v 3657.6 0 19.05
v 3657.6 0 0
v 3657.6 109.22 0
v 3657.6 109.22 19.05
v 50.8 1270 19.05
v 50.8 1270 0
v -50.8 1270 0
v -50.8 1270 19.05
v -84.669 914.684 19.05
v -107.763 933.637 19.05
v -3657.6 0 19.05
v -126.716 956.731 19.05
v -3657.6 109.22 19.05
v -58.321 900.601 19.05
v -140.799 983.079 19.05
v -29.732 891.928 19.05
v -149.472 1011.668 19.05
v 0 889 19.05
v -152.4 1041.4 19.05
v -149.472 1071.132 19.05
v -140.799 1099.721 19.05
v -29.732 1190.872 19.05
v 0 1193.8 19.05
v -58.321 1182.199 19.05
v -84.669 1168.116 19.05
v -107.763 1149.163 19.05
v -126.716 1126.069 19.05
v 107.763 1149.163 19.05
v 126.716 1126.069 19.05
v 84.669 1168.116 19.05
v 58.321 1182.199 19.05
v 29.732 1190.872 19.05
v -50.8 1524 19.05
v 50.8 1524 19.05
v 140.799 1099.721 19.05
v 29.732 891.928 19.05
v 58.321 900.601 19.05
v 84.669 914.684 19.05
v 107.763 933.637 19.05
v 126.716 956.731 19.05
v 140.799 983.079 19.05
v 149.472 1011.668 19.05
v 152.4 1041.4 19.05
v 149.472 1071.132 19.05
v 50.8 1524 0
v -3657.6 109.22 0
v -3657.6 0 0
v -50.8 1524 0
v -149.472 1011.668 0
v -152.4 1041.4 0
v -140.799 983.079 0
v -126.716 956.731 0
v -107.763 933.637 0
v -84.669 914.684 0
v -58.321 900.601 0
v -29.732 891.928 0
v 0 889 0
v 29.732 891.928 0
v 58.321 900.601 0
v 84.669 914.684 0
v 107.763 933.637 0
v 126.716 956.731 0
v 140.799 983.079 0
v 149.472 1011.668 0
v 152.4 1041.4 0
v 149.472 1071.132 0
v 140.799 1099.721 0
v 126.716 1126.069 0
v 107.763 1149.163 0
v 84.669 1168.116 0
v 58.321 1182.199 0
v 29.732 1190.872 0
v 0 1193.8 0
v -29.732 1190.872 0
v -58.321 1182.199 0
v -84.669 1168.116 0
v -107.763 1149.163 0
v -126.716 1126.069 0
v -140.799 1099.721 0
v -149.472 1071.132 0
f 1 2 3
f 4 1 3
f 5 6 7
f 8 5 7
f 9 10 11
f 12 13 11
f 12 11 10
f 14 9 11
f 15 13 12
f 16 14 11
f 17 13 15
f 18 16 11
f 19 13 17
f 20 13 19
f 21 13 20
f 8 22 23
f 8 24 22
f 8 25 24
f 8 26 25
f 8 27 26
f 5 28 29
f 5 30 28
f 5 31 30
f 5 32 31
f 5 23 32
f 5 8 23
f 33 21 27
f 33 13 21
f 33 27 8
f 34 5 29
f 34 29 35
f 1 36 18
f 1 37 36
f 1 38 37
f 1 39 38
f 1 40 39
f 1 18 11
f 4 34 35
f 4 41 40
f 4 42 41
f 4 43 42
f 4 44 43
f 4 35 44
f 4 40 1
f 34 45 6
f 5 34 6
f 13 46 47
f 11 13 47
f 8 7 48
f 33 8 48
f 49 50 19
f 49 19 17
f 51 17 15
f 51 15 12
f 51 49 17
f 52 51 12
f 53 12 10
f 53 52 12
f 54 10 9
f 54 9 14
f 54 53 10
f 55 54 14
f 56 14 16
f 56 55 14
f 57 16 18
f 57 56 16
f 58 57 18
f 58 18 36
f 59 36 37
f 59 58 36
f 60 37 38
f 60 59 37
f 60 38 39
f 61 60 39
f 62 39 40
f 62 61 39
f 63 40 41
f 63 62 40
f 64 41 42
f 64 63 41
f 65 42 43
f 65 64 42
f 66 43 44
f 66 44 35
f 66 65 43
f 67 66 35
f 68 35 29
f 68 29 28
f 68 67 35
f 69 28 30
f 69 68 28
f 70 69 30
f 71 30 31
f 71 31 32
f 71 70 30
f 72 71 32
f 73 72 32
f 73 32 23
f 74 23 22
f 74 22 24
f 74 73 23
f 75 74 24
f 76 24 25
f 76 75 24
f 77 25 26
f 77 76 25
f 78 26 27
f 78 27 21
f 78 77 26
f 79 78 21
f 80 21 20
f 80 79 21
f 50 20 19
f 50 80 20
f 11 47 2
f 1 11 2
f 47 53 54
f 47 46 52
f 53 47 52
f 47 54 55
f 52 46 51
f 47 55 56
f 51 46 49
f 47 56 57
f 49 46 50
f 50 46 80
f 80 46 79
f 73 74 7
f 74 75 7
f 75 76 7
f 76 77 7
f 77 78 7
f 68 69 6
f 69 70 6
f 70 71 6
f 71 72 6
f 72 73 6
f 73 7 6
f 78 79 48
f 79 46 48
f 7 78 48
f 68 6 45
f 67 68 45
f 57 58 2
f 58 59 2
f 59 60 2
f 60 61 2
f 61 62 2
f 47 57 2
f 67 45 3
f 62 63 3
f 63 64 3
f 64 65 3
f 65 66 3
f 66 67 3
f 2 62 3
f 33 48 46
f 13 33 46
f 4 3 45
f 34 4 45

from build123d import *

# Parameters (mm, degrees)
SKETCH1_R           = 152.4
BOSS_EXTRUDE1_DEPTH = 19.05


with BuildPart() as part:
    # Sketch1 → Boss-Extrude1 (new body)
    with BuildSketch(Plane.XY):
        Polygon((0, 0), (3657.6, 0), (3657.6, 109.22), (50.8, 1524), (50.8, 1270), (-50.8, 1270), (-50.8, 1524), (-3657.6, 109.22), (-3657.6, 0), align=None)
        with Locations(Location((0, 1041.4, 0), (0, 0, 180))):
            Circle(SKETCH1_R, mode=Mode.SUBTRACT)
    extrude(amount=BOSS_EXTRUDE1_DEPTH)


solid = part.part
